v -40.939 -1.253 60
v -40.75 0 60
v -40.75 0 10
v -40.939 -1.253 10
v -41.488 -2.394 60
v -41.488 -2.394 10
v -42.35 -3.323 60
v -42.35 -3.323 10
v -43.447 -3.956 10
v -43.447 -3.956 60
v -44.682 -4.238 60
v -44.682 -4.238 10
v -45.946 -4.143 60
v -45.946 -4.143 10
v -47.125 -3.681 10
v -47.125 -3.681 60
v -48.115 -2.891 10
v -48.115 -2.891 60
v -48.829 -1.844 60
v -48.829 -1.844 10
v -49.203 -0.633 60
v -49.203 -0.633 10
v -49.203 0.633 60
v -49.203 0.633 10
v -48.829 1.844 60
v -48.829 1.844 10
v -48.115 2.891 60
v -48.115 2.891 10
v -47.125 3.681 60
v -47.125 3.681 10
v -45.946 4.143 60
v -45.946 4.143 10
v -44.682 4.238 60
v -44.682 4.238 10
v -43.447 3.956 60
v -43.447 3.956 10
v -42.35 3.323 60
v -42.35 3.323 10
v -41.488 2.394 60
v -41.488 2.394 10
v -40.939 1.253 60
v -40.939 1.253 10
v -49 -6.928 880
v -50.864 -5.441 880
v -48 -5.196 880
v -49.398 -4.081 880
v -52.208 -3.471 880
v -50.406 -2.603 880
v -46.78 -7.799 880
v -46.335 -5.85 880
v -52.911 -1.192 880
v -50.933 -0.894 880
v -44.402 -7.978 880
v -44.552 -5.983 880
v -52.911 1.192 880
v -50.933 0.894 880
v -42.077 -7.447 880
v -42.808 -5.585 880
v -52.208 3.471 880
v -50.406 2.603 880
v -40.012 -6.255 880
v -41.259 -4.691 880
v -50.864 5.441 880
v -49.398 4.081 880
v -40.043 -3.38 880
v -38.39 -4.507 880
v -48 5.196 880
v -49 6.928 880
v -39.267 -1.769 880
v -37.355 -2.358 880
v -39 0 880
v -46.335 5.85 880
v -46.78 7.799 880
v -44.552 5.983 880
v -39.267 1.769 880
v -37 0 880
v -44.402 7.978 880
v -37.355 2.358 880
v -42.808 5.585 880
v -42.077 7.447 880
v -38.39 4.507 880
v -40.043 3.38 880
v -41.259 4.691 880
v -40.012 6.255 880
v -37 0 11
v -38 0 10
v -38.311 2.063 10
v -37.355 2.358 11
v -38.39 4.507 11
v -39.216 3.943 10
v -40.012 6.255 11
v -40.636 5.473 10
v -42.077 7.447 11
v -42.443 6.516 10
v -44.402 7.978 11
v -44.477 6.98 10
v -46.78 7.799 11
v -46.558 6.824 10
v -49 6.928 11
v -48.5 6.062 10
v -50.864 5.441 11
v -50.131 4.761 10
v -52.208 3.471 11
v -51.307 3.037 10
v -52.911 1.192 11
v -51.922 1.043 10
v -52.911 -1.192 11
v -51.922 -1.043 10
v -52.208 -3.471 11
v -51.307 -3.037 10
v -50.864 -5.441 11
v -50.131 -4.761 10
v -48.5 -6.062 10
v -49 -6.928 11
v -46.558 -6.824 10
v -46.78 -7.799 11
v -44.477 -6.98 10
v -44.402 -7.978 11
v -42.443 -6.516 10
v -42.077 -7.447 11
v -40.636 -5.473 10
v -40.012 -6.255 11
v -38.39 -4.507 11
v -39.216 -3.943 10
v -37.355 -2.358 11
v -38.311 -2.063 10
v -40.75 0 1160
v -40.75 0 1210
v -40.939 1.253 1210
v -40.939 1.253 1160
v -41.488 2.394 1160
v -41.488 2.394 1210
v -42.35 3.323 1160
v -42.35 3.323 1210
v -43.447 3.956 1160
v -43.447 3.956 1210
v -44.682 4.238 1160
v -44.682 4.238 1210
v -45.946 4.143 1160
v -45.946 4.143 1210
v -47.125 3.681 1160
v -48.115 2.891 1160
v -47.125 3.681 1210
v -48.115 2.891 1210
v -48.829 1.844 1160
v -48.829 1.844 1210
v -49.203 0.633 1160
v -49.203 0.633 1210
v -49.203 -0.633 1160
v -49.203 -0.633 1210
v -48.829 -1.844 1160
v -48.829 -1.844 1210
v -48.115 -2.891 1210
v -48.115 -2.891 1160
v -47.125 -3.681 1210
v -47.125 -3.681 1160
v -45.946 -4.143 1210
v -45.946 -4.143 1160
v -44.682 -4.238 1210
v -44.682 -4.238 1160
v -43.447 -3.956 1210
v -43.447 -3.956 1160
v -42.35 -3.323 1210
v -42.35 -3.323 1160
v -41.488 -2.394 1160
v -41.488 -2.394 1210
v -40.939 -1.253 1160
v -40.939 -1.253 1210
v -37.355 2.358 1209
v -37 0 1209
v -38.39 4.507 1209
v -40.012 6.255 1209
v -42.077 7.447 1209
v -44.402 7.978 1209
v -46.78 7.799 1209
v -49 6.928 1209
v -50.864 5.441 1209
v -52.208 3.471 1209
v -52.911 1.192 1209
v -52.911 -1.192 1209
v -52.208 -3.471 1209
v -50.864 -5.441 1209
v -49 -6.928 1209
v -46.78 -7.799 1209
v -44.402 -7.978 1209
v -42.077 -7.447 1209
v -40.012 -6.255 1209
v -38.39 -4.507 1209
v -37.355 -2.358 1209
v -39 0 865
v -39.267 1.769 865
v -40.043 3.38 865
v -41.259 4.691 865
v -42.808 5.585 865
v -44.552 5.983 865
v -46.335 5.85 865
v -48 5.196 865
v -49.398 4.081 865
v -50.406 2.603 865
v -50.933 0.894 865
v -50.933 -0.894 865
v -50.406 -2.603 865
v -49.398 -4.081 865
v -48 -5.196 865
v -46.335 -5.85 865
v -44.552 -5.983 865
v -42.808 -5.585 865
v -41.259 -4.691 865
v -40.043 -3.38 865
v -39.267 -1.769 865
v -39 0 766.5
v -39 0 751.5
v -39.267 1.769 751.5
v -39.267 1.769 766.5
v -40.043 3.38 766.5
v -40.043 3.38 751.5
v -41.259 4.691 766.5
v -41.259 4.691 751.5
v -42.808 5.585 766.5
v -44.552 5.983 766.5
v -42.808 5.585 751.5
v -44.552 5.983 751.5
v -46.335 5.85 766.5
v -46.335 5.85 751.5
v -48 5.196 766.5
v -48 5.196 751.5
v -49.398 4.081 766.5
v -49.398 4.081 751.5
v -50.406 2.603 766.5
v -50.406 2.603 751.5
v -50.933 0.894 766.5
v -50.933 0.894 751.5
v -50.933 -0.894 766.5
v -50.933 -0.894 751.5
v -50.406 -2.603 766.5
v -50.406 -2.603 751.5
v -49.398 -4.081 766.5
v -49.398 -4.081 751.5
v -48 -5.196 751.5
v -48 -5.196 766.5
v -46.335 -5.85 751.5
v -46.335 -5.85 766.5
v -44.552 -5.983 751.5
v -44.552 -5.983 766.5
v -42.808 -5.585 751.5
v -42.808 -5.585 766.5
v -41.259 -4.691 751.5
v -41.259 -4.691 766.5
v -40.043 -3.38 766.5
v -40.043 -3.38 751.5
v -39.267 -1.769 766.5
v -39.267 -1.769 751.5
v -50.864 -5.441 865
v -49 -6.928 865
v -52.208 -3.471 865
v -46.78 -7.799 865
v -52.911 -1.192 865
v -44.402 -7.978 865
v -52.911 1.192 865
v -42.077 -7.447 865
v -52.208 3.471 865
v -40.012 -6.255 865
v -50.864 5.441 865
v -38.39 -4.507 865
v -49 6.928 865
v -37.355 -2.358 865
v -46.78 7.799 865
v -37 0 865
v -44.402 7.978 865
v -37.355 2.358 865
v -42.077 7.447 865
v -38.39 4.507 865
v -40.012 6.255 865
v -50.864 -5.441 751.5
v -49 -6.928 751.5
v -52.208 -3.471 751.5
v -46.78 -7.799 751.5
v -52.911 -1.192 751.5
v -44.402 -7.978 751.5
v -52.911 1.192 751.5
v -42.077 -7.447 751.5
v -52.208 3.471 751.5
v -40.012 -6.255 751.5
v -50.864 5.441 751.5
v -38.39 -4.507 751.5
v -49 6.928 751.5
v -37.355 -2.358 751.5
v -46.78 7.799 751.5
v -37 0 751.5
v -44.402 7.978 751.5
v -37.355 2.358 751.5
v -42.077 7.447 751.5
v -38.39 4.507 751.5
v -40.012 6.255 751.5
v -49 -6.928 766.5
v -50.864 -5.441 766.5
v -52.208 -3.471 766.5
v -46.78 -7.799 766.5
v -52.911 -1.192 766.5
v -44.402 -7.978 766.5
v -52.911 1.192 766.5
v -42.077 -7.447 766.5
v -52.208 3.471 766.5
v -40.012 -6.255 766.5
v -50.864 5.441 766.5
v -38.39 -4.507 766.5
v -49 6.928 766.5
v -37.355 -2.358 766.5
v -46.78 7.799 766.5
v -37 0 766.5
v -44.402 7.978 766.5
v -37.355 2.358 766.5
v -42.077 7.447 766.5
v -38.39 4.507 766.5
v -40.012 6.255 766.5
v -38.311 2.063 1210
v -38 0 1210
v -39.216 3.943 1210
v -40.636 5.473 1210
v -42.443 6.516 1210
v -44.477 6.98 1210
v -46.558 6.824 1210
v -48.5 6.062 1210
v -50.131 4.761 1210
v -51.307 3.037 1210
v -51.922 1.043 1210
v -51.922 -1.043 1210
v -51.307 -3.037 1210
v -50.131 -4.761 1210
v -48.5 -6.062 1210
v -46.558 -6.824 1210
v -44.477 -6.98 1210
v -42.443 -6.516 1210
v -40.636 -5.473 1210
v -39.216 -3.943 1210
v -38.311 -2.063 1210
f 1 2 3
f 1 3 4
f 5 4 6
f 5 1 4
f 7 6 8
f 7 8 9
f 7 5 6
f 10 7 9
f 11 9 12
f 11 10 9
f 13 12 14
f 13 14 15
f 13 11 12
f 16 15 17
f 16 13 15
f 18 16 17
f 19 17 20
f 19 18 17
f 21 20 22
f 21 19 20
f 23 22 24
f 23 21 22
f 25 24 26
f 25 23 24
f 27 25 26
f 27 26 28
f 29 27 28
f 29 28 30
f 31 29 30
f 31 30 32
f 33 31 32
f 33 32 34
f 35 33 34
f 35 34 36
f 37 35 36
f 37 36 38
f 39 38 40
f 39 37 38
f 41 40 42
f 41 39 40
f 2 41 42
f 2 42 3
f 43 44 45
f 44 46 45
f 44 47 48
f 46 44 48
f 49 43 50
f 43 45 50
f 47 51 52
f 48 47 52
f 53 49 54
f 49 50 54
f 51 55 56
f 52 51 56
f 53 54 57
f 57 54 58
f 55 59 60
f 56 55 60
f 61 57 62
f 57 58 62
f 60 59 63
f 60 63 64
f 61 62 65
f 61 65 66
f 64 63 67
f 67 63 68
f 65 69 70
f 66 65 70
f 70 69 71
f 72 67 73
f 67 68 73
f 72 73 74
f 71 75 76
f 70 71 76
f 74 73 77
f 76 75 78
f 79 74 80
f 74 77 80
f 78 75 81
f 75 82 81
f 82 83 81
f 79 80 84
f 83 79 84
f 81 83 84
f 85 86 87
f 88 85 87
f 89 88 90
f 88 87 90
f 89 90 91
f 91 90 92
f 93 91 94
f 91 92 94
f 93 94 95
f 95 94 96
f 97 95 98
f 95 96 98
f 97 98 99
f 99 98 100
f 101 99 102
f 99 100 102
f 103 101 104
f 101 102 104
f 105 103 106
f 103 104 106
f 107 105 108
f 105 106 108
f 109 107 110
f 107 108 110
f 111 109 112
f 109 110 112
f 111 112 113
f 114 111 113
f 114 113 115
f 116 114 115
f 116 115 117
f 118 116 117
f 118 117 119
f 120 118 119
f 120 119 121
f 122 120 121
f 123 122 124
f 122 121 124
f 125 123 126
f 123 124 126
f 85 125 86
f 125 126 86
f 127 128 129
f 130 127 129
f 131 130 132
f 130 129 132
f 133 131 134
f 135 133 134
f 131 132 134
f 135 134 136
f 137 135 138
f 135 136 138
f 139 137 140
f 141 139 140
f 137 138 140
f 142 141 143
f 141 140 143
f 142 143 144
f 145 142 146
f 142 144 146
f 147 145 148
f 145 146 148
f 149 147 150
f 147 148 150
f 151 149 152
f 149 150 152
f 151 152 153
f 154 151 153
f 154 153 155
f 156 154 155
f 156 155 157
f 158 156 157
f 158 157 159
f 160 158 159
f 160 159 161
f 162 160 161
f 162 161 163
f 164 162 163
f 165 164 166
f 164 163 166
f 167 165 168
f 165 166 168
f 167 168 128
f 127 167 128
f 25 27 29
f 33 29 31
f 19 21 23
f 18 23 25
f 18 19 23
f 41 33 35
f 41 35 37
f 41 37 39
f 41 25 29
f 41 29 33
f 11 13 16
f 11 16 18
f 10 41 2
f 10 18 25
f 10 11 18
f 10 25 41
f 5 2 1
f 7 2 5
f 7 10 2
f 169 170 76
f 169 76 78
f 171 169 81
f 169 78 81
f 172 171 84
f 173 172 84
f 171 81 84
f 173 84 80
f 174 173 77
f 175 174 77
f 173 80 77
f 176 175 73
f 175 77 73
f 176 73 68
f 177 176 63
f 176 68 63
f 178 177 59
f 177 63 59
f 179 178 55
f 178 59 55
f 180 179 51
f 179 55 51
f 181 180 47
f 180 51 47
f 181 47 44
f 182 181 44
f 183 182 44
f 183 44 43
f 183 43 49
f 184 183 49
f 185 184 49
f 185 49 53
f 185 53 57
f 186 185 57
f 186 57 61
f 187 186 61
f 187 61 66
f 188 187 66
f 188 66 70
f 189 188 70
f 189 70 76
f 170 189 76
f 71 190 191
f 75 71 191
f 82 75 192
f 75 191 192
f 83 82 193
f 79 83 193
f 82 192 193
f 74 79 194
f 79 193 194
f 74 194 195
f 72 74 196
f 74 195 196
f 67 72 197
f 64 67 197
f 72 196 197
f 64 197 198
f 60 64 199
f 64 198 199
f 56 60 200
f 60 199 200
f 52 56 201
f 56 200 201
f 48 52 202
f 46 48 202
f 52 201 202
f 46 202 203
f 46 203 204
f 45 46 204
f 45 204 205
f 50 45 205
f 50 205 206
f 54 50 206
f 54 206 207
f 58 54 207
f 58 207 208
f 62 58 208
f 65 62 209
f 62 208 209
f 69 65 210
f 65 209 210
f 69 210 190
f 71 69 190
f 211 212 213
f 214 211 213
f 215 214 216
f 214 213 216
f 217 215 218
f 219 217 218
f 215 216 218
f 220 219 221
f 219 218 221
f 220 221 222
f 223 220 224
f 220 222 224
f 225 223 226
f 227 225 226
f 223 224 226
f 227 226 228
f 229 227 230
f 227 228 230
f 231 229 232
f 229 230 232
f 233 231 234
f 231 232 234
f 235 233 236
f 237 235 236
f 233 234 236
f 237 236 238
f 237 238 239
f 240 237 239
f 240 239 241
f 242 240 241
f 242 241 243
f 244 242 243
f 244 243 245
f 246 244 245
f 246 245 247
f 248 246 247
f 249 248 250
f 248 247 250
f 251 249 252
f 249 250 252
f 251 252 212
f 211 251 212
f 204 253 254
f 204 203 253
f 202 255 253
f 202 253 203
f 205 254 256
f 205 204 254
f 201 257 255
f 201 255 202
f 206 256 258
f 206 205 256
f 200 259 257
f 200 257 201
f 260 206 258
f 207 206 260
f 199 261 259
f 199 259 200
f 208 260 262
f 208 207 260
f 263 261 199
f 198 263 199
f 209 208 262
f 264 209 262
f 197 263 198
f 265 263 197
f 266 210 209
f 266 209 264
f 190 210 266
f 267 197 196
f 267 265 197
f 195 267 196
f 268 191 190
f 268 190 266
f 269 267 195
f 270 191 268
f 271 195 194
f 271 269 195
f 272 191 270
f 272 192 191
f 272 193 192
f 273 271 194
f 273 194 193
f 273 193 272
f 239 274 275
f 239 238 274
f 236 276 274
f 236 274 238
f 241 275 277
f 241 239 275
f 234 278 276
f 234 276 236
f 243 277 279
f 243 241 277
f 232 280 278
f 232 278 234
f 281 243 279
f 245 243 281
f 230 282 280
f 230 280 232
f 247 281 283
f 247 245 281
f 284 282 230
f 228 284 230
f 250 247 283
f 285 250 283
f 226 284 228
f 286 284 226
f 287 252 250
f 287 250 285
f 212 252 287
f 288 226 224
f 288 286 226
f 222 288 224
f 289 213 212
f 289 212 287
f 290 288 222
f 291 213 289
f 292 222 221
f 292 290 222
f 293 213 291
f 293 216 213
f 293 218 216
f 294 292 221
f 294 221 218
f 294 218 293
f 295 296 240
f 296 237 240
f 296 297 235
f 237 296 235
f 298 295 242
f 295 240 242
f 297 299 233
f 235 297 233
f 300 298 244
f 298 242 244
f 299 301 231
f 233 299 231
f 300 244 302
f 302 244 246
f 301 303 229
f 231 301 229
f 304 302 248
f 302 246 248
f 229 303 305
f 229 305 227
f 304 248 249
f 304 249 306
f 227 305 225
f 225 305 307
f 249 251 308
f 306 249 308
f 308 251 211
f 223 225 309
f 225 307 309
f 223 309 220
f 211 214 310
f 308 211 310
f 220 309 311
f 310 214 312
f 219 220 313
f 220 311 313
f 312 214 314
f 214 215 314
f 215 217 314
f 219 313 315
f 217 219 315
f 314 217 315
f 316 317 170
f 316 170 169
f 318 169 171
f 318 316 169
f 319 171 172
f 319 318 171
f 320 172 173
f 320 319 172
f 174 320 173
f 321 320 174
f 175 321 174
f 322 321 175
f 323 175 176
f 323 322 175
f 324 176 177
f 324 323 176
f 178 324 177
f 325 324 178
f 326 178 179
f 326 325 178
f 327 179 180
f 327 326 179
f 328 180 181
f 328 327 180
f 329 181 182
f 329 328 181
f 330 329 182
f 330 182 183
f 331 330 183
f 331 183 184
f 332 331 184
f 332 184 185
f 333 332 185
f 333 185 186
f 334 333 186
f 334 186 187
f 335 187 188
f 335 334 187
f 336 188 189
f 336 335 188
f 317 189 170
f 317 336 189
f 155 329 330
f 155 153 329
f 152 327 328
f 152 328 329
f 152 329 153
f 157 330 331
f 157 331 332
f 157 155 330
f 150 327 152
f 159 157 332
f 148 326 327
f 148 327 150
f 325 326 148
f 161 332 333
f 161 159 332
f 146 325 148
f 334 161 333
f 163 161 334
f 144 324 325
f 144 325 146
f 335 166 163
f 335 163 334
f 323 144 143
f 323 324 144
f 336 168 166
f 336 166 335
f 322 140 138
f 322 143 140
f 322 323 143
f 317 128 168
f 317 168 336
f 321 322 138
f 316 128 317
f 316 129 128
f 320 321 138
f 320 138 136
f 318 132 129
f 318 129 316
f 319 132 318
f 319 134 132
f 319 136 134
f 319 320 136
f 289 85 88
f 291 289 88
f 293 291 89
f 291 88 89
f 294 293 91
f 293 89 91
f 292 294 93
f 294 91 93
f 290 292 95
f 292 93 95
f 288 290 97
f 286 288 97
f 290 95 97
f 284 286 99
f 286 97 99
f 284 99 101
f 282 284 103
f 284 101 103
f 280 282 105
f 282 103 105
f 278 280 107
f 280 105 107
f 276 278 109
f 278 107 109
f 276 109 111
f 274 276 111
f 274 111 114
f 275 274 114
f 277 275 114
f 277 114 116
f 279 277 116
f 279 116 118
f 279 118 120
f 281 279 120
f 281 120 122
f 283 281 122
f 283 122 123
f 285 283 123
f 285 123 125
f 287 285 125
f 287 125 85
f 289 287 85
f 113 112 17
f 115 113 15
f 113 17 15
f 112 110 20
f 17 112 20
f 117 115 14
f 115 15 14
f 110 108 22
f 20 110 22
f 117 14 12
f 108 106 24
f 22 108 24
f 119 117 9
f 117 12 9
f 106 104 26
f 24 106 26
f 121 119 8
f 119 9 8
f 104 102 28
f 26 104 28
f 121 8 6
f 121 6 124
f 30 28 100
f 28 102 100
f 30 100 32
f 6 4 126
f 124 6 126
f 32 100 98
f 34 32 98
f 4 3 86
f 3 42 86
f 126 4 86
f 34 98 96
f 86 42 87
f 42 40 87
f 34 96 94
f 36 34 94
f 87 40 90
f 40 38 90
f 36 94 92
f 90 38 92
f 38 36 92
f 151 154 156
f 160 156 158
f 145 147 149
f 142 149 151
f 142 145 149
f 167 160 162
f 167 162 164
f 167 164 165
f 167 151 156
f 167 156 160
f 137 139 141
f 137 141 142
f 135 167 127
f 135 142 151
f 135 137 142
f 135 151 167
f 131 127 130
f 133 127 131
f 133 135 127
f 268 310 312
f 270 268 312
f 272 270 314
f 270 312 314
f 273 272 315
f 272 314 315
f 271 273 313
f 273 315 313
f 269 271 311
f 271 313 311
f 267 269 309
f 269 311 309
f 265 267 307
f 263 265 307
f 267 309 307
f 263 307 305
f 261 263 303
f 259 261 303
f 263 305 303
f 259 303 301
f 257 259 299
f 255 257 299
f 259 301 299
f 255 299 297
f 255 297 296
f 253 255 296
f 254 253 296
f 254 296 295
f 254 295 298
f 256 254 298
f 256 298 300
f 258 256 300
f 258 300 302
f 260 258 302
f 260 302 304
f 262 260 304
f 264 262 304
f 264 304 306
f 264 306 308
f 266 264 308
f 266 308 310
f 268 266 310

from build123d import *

# Parameters (mm, degrees)
BOSS_EXTRUDE1_START = 10
SKETCH1_R           = 8
BOSS_EXTRUDE1_DEPTH = 1200
CHAMFER1_SIZE       = 1
SKETCH2_R           = 4.25
CUT_EXTRUDE1_DEPTH  = 50
CUT_EXTRUDE2_START  = -50
SKETCH3_R           = 4.25
CUT_EXTRUDE2_DEPTH  = 50
CUT_EXTRUDE3_START  = -458.5
SKETCH4_R           = 8
SKETCH4_R_2         = 6
CUT_EXTRUDE3_DEPTH  = 15
CUT_EXTRUDE4_START  = -345
SKETCH4_2_R         = 8
SKETCH4_2_R_2       = 6
CUT_EXTRUDE4_DEPTH  = 15


with BuildPart() as part:
    # Sketch1 → Boss-Extrude1 (new body)
    with BuildSketch(Plane.XY.offset(BOSS_EXTRUDE1_START)):
        with Locations((-45, 0)):
            Circle(SKETCH1_R)
    extrude(amount=BOSS_EXTRUDE1_DEPTH)

    # Chamfer1
    chamfer1_edges = [part.edges().sort_by_distance(p)[0] for p in [
        (-53, 0, 1210),
        (-53, 0, 10),
    ]]
    chamfer(chamfer1_edges, length=CHAMFER1_SIZE)

    # Sketch2 → Cut-Extrude1 (cut)
    with BuildSketch(Plane.XY.offset(1210)):
        with Locations((-45, 0)):
            Circle(SKETCH2_R)
    extrude(amount=-CUT_EXTRUDE1_DEPTH, mode=Mode.SUBTRACT)

    # Sketch3 → Cut-Extrude2 (cut)
    with BuildSketch(Plane(origin=(0, 0, 10), x_dir=(-1, 0, 0), z_dir=(0, 0, -1)).offset(CUT_EXTRUDE2_START)):
        with Locations((45, 0)):
            Circle(SKETCH3_R)
    extrude(amount=CUT_EXTRUDE2_DEPTH, mode=Mode.SUBTRACT)

    # Sketch4 → Cut-Extrude3 (cut)
    with BuildSketch(Plane.XY.offset(1210).offset(CUT_EXTRUDE3_START)):
        with Locations((-45, 0)):
            Circle(SKETCH4_R)
        with Locations((-45, 0)):
            Circle(SKETCH4_R_2, mode=Mode.SUBTRACT)
    extrude(amount=CUT_EXTRUDE3_DEPTH, mode=Mode.SUBTRACT)

    # Sketch4<2> → Cut-Extrude4 (cut)
    with BuildSketch(Plane.XY.offset(1210).offset(CUT_EXTRUDE4_START)):
        with Locations((-45, 0)):
            Circle(SKETCH4_2_R)
        with Locations((-45, 0)):
            Circle(SKETCH4_2_R_2, mode=Mode.SUBTRACT)
    extrude(amount=CUT_EXTRUDE4_DEPTH, mode=Mode.SUBTRACT)


solid = part.part
